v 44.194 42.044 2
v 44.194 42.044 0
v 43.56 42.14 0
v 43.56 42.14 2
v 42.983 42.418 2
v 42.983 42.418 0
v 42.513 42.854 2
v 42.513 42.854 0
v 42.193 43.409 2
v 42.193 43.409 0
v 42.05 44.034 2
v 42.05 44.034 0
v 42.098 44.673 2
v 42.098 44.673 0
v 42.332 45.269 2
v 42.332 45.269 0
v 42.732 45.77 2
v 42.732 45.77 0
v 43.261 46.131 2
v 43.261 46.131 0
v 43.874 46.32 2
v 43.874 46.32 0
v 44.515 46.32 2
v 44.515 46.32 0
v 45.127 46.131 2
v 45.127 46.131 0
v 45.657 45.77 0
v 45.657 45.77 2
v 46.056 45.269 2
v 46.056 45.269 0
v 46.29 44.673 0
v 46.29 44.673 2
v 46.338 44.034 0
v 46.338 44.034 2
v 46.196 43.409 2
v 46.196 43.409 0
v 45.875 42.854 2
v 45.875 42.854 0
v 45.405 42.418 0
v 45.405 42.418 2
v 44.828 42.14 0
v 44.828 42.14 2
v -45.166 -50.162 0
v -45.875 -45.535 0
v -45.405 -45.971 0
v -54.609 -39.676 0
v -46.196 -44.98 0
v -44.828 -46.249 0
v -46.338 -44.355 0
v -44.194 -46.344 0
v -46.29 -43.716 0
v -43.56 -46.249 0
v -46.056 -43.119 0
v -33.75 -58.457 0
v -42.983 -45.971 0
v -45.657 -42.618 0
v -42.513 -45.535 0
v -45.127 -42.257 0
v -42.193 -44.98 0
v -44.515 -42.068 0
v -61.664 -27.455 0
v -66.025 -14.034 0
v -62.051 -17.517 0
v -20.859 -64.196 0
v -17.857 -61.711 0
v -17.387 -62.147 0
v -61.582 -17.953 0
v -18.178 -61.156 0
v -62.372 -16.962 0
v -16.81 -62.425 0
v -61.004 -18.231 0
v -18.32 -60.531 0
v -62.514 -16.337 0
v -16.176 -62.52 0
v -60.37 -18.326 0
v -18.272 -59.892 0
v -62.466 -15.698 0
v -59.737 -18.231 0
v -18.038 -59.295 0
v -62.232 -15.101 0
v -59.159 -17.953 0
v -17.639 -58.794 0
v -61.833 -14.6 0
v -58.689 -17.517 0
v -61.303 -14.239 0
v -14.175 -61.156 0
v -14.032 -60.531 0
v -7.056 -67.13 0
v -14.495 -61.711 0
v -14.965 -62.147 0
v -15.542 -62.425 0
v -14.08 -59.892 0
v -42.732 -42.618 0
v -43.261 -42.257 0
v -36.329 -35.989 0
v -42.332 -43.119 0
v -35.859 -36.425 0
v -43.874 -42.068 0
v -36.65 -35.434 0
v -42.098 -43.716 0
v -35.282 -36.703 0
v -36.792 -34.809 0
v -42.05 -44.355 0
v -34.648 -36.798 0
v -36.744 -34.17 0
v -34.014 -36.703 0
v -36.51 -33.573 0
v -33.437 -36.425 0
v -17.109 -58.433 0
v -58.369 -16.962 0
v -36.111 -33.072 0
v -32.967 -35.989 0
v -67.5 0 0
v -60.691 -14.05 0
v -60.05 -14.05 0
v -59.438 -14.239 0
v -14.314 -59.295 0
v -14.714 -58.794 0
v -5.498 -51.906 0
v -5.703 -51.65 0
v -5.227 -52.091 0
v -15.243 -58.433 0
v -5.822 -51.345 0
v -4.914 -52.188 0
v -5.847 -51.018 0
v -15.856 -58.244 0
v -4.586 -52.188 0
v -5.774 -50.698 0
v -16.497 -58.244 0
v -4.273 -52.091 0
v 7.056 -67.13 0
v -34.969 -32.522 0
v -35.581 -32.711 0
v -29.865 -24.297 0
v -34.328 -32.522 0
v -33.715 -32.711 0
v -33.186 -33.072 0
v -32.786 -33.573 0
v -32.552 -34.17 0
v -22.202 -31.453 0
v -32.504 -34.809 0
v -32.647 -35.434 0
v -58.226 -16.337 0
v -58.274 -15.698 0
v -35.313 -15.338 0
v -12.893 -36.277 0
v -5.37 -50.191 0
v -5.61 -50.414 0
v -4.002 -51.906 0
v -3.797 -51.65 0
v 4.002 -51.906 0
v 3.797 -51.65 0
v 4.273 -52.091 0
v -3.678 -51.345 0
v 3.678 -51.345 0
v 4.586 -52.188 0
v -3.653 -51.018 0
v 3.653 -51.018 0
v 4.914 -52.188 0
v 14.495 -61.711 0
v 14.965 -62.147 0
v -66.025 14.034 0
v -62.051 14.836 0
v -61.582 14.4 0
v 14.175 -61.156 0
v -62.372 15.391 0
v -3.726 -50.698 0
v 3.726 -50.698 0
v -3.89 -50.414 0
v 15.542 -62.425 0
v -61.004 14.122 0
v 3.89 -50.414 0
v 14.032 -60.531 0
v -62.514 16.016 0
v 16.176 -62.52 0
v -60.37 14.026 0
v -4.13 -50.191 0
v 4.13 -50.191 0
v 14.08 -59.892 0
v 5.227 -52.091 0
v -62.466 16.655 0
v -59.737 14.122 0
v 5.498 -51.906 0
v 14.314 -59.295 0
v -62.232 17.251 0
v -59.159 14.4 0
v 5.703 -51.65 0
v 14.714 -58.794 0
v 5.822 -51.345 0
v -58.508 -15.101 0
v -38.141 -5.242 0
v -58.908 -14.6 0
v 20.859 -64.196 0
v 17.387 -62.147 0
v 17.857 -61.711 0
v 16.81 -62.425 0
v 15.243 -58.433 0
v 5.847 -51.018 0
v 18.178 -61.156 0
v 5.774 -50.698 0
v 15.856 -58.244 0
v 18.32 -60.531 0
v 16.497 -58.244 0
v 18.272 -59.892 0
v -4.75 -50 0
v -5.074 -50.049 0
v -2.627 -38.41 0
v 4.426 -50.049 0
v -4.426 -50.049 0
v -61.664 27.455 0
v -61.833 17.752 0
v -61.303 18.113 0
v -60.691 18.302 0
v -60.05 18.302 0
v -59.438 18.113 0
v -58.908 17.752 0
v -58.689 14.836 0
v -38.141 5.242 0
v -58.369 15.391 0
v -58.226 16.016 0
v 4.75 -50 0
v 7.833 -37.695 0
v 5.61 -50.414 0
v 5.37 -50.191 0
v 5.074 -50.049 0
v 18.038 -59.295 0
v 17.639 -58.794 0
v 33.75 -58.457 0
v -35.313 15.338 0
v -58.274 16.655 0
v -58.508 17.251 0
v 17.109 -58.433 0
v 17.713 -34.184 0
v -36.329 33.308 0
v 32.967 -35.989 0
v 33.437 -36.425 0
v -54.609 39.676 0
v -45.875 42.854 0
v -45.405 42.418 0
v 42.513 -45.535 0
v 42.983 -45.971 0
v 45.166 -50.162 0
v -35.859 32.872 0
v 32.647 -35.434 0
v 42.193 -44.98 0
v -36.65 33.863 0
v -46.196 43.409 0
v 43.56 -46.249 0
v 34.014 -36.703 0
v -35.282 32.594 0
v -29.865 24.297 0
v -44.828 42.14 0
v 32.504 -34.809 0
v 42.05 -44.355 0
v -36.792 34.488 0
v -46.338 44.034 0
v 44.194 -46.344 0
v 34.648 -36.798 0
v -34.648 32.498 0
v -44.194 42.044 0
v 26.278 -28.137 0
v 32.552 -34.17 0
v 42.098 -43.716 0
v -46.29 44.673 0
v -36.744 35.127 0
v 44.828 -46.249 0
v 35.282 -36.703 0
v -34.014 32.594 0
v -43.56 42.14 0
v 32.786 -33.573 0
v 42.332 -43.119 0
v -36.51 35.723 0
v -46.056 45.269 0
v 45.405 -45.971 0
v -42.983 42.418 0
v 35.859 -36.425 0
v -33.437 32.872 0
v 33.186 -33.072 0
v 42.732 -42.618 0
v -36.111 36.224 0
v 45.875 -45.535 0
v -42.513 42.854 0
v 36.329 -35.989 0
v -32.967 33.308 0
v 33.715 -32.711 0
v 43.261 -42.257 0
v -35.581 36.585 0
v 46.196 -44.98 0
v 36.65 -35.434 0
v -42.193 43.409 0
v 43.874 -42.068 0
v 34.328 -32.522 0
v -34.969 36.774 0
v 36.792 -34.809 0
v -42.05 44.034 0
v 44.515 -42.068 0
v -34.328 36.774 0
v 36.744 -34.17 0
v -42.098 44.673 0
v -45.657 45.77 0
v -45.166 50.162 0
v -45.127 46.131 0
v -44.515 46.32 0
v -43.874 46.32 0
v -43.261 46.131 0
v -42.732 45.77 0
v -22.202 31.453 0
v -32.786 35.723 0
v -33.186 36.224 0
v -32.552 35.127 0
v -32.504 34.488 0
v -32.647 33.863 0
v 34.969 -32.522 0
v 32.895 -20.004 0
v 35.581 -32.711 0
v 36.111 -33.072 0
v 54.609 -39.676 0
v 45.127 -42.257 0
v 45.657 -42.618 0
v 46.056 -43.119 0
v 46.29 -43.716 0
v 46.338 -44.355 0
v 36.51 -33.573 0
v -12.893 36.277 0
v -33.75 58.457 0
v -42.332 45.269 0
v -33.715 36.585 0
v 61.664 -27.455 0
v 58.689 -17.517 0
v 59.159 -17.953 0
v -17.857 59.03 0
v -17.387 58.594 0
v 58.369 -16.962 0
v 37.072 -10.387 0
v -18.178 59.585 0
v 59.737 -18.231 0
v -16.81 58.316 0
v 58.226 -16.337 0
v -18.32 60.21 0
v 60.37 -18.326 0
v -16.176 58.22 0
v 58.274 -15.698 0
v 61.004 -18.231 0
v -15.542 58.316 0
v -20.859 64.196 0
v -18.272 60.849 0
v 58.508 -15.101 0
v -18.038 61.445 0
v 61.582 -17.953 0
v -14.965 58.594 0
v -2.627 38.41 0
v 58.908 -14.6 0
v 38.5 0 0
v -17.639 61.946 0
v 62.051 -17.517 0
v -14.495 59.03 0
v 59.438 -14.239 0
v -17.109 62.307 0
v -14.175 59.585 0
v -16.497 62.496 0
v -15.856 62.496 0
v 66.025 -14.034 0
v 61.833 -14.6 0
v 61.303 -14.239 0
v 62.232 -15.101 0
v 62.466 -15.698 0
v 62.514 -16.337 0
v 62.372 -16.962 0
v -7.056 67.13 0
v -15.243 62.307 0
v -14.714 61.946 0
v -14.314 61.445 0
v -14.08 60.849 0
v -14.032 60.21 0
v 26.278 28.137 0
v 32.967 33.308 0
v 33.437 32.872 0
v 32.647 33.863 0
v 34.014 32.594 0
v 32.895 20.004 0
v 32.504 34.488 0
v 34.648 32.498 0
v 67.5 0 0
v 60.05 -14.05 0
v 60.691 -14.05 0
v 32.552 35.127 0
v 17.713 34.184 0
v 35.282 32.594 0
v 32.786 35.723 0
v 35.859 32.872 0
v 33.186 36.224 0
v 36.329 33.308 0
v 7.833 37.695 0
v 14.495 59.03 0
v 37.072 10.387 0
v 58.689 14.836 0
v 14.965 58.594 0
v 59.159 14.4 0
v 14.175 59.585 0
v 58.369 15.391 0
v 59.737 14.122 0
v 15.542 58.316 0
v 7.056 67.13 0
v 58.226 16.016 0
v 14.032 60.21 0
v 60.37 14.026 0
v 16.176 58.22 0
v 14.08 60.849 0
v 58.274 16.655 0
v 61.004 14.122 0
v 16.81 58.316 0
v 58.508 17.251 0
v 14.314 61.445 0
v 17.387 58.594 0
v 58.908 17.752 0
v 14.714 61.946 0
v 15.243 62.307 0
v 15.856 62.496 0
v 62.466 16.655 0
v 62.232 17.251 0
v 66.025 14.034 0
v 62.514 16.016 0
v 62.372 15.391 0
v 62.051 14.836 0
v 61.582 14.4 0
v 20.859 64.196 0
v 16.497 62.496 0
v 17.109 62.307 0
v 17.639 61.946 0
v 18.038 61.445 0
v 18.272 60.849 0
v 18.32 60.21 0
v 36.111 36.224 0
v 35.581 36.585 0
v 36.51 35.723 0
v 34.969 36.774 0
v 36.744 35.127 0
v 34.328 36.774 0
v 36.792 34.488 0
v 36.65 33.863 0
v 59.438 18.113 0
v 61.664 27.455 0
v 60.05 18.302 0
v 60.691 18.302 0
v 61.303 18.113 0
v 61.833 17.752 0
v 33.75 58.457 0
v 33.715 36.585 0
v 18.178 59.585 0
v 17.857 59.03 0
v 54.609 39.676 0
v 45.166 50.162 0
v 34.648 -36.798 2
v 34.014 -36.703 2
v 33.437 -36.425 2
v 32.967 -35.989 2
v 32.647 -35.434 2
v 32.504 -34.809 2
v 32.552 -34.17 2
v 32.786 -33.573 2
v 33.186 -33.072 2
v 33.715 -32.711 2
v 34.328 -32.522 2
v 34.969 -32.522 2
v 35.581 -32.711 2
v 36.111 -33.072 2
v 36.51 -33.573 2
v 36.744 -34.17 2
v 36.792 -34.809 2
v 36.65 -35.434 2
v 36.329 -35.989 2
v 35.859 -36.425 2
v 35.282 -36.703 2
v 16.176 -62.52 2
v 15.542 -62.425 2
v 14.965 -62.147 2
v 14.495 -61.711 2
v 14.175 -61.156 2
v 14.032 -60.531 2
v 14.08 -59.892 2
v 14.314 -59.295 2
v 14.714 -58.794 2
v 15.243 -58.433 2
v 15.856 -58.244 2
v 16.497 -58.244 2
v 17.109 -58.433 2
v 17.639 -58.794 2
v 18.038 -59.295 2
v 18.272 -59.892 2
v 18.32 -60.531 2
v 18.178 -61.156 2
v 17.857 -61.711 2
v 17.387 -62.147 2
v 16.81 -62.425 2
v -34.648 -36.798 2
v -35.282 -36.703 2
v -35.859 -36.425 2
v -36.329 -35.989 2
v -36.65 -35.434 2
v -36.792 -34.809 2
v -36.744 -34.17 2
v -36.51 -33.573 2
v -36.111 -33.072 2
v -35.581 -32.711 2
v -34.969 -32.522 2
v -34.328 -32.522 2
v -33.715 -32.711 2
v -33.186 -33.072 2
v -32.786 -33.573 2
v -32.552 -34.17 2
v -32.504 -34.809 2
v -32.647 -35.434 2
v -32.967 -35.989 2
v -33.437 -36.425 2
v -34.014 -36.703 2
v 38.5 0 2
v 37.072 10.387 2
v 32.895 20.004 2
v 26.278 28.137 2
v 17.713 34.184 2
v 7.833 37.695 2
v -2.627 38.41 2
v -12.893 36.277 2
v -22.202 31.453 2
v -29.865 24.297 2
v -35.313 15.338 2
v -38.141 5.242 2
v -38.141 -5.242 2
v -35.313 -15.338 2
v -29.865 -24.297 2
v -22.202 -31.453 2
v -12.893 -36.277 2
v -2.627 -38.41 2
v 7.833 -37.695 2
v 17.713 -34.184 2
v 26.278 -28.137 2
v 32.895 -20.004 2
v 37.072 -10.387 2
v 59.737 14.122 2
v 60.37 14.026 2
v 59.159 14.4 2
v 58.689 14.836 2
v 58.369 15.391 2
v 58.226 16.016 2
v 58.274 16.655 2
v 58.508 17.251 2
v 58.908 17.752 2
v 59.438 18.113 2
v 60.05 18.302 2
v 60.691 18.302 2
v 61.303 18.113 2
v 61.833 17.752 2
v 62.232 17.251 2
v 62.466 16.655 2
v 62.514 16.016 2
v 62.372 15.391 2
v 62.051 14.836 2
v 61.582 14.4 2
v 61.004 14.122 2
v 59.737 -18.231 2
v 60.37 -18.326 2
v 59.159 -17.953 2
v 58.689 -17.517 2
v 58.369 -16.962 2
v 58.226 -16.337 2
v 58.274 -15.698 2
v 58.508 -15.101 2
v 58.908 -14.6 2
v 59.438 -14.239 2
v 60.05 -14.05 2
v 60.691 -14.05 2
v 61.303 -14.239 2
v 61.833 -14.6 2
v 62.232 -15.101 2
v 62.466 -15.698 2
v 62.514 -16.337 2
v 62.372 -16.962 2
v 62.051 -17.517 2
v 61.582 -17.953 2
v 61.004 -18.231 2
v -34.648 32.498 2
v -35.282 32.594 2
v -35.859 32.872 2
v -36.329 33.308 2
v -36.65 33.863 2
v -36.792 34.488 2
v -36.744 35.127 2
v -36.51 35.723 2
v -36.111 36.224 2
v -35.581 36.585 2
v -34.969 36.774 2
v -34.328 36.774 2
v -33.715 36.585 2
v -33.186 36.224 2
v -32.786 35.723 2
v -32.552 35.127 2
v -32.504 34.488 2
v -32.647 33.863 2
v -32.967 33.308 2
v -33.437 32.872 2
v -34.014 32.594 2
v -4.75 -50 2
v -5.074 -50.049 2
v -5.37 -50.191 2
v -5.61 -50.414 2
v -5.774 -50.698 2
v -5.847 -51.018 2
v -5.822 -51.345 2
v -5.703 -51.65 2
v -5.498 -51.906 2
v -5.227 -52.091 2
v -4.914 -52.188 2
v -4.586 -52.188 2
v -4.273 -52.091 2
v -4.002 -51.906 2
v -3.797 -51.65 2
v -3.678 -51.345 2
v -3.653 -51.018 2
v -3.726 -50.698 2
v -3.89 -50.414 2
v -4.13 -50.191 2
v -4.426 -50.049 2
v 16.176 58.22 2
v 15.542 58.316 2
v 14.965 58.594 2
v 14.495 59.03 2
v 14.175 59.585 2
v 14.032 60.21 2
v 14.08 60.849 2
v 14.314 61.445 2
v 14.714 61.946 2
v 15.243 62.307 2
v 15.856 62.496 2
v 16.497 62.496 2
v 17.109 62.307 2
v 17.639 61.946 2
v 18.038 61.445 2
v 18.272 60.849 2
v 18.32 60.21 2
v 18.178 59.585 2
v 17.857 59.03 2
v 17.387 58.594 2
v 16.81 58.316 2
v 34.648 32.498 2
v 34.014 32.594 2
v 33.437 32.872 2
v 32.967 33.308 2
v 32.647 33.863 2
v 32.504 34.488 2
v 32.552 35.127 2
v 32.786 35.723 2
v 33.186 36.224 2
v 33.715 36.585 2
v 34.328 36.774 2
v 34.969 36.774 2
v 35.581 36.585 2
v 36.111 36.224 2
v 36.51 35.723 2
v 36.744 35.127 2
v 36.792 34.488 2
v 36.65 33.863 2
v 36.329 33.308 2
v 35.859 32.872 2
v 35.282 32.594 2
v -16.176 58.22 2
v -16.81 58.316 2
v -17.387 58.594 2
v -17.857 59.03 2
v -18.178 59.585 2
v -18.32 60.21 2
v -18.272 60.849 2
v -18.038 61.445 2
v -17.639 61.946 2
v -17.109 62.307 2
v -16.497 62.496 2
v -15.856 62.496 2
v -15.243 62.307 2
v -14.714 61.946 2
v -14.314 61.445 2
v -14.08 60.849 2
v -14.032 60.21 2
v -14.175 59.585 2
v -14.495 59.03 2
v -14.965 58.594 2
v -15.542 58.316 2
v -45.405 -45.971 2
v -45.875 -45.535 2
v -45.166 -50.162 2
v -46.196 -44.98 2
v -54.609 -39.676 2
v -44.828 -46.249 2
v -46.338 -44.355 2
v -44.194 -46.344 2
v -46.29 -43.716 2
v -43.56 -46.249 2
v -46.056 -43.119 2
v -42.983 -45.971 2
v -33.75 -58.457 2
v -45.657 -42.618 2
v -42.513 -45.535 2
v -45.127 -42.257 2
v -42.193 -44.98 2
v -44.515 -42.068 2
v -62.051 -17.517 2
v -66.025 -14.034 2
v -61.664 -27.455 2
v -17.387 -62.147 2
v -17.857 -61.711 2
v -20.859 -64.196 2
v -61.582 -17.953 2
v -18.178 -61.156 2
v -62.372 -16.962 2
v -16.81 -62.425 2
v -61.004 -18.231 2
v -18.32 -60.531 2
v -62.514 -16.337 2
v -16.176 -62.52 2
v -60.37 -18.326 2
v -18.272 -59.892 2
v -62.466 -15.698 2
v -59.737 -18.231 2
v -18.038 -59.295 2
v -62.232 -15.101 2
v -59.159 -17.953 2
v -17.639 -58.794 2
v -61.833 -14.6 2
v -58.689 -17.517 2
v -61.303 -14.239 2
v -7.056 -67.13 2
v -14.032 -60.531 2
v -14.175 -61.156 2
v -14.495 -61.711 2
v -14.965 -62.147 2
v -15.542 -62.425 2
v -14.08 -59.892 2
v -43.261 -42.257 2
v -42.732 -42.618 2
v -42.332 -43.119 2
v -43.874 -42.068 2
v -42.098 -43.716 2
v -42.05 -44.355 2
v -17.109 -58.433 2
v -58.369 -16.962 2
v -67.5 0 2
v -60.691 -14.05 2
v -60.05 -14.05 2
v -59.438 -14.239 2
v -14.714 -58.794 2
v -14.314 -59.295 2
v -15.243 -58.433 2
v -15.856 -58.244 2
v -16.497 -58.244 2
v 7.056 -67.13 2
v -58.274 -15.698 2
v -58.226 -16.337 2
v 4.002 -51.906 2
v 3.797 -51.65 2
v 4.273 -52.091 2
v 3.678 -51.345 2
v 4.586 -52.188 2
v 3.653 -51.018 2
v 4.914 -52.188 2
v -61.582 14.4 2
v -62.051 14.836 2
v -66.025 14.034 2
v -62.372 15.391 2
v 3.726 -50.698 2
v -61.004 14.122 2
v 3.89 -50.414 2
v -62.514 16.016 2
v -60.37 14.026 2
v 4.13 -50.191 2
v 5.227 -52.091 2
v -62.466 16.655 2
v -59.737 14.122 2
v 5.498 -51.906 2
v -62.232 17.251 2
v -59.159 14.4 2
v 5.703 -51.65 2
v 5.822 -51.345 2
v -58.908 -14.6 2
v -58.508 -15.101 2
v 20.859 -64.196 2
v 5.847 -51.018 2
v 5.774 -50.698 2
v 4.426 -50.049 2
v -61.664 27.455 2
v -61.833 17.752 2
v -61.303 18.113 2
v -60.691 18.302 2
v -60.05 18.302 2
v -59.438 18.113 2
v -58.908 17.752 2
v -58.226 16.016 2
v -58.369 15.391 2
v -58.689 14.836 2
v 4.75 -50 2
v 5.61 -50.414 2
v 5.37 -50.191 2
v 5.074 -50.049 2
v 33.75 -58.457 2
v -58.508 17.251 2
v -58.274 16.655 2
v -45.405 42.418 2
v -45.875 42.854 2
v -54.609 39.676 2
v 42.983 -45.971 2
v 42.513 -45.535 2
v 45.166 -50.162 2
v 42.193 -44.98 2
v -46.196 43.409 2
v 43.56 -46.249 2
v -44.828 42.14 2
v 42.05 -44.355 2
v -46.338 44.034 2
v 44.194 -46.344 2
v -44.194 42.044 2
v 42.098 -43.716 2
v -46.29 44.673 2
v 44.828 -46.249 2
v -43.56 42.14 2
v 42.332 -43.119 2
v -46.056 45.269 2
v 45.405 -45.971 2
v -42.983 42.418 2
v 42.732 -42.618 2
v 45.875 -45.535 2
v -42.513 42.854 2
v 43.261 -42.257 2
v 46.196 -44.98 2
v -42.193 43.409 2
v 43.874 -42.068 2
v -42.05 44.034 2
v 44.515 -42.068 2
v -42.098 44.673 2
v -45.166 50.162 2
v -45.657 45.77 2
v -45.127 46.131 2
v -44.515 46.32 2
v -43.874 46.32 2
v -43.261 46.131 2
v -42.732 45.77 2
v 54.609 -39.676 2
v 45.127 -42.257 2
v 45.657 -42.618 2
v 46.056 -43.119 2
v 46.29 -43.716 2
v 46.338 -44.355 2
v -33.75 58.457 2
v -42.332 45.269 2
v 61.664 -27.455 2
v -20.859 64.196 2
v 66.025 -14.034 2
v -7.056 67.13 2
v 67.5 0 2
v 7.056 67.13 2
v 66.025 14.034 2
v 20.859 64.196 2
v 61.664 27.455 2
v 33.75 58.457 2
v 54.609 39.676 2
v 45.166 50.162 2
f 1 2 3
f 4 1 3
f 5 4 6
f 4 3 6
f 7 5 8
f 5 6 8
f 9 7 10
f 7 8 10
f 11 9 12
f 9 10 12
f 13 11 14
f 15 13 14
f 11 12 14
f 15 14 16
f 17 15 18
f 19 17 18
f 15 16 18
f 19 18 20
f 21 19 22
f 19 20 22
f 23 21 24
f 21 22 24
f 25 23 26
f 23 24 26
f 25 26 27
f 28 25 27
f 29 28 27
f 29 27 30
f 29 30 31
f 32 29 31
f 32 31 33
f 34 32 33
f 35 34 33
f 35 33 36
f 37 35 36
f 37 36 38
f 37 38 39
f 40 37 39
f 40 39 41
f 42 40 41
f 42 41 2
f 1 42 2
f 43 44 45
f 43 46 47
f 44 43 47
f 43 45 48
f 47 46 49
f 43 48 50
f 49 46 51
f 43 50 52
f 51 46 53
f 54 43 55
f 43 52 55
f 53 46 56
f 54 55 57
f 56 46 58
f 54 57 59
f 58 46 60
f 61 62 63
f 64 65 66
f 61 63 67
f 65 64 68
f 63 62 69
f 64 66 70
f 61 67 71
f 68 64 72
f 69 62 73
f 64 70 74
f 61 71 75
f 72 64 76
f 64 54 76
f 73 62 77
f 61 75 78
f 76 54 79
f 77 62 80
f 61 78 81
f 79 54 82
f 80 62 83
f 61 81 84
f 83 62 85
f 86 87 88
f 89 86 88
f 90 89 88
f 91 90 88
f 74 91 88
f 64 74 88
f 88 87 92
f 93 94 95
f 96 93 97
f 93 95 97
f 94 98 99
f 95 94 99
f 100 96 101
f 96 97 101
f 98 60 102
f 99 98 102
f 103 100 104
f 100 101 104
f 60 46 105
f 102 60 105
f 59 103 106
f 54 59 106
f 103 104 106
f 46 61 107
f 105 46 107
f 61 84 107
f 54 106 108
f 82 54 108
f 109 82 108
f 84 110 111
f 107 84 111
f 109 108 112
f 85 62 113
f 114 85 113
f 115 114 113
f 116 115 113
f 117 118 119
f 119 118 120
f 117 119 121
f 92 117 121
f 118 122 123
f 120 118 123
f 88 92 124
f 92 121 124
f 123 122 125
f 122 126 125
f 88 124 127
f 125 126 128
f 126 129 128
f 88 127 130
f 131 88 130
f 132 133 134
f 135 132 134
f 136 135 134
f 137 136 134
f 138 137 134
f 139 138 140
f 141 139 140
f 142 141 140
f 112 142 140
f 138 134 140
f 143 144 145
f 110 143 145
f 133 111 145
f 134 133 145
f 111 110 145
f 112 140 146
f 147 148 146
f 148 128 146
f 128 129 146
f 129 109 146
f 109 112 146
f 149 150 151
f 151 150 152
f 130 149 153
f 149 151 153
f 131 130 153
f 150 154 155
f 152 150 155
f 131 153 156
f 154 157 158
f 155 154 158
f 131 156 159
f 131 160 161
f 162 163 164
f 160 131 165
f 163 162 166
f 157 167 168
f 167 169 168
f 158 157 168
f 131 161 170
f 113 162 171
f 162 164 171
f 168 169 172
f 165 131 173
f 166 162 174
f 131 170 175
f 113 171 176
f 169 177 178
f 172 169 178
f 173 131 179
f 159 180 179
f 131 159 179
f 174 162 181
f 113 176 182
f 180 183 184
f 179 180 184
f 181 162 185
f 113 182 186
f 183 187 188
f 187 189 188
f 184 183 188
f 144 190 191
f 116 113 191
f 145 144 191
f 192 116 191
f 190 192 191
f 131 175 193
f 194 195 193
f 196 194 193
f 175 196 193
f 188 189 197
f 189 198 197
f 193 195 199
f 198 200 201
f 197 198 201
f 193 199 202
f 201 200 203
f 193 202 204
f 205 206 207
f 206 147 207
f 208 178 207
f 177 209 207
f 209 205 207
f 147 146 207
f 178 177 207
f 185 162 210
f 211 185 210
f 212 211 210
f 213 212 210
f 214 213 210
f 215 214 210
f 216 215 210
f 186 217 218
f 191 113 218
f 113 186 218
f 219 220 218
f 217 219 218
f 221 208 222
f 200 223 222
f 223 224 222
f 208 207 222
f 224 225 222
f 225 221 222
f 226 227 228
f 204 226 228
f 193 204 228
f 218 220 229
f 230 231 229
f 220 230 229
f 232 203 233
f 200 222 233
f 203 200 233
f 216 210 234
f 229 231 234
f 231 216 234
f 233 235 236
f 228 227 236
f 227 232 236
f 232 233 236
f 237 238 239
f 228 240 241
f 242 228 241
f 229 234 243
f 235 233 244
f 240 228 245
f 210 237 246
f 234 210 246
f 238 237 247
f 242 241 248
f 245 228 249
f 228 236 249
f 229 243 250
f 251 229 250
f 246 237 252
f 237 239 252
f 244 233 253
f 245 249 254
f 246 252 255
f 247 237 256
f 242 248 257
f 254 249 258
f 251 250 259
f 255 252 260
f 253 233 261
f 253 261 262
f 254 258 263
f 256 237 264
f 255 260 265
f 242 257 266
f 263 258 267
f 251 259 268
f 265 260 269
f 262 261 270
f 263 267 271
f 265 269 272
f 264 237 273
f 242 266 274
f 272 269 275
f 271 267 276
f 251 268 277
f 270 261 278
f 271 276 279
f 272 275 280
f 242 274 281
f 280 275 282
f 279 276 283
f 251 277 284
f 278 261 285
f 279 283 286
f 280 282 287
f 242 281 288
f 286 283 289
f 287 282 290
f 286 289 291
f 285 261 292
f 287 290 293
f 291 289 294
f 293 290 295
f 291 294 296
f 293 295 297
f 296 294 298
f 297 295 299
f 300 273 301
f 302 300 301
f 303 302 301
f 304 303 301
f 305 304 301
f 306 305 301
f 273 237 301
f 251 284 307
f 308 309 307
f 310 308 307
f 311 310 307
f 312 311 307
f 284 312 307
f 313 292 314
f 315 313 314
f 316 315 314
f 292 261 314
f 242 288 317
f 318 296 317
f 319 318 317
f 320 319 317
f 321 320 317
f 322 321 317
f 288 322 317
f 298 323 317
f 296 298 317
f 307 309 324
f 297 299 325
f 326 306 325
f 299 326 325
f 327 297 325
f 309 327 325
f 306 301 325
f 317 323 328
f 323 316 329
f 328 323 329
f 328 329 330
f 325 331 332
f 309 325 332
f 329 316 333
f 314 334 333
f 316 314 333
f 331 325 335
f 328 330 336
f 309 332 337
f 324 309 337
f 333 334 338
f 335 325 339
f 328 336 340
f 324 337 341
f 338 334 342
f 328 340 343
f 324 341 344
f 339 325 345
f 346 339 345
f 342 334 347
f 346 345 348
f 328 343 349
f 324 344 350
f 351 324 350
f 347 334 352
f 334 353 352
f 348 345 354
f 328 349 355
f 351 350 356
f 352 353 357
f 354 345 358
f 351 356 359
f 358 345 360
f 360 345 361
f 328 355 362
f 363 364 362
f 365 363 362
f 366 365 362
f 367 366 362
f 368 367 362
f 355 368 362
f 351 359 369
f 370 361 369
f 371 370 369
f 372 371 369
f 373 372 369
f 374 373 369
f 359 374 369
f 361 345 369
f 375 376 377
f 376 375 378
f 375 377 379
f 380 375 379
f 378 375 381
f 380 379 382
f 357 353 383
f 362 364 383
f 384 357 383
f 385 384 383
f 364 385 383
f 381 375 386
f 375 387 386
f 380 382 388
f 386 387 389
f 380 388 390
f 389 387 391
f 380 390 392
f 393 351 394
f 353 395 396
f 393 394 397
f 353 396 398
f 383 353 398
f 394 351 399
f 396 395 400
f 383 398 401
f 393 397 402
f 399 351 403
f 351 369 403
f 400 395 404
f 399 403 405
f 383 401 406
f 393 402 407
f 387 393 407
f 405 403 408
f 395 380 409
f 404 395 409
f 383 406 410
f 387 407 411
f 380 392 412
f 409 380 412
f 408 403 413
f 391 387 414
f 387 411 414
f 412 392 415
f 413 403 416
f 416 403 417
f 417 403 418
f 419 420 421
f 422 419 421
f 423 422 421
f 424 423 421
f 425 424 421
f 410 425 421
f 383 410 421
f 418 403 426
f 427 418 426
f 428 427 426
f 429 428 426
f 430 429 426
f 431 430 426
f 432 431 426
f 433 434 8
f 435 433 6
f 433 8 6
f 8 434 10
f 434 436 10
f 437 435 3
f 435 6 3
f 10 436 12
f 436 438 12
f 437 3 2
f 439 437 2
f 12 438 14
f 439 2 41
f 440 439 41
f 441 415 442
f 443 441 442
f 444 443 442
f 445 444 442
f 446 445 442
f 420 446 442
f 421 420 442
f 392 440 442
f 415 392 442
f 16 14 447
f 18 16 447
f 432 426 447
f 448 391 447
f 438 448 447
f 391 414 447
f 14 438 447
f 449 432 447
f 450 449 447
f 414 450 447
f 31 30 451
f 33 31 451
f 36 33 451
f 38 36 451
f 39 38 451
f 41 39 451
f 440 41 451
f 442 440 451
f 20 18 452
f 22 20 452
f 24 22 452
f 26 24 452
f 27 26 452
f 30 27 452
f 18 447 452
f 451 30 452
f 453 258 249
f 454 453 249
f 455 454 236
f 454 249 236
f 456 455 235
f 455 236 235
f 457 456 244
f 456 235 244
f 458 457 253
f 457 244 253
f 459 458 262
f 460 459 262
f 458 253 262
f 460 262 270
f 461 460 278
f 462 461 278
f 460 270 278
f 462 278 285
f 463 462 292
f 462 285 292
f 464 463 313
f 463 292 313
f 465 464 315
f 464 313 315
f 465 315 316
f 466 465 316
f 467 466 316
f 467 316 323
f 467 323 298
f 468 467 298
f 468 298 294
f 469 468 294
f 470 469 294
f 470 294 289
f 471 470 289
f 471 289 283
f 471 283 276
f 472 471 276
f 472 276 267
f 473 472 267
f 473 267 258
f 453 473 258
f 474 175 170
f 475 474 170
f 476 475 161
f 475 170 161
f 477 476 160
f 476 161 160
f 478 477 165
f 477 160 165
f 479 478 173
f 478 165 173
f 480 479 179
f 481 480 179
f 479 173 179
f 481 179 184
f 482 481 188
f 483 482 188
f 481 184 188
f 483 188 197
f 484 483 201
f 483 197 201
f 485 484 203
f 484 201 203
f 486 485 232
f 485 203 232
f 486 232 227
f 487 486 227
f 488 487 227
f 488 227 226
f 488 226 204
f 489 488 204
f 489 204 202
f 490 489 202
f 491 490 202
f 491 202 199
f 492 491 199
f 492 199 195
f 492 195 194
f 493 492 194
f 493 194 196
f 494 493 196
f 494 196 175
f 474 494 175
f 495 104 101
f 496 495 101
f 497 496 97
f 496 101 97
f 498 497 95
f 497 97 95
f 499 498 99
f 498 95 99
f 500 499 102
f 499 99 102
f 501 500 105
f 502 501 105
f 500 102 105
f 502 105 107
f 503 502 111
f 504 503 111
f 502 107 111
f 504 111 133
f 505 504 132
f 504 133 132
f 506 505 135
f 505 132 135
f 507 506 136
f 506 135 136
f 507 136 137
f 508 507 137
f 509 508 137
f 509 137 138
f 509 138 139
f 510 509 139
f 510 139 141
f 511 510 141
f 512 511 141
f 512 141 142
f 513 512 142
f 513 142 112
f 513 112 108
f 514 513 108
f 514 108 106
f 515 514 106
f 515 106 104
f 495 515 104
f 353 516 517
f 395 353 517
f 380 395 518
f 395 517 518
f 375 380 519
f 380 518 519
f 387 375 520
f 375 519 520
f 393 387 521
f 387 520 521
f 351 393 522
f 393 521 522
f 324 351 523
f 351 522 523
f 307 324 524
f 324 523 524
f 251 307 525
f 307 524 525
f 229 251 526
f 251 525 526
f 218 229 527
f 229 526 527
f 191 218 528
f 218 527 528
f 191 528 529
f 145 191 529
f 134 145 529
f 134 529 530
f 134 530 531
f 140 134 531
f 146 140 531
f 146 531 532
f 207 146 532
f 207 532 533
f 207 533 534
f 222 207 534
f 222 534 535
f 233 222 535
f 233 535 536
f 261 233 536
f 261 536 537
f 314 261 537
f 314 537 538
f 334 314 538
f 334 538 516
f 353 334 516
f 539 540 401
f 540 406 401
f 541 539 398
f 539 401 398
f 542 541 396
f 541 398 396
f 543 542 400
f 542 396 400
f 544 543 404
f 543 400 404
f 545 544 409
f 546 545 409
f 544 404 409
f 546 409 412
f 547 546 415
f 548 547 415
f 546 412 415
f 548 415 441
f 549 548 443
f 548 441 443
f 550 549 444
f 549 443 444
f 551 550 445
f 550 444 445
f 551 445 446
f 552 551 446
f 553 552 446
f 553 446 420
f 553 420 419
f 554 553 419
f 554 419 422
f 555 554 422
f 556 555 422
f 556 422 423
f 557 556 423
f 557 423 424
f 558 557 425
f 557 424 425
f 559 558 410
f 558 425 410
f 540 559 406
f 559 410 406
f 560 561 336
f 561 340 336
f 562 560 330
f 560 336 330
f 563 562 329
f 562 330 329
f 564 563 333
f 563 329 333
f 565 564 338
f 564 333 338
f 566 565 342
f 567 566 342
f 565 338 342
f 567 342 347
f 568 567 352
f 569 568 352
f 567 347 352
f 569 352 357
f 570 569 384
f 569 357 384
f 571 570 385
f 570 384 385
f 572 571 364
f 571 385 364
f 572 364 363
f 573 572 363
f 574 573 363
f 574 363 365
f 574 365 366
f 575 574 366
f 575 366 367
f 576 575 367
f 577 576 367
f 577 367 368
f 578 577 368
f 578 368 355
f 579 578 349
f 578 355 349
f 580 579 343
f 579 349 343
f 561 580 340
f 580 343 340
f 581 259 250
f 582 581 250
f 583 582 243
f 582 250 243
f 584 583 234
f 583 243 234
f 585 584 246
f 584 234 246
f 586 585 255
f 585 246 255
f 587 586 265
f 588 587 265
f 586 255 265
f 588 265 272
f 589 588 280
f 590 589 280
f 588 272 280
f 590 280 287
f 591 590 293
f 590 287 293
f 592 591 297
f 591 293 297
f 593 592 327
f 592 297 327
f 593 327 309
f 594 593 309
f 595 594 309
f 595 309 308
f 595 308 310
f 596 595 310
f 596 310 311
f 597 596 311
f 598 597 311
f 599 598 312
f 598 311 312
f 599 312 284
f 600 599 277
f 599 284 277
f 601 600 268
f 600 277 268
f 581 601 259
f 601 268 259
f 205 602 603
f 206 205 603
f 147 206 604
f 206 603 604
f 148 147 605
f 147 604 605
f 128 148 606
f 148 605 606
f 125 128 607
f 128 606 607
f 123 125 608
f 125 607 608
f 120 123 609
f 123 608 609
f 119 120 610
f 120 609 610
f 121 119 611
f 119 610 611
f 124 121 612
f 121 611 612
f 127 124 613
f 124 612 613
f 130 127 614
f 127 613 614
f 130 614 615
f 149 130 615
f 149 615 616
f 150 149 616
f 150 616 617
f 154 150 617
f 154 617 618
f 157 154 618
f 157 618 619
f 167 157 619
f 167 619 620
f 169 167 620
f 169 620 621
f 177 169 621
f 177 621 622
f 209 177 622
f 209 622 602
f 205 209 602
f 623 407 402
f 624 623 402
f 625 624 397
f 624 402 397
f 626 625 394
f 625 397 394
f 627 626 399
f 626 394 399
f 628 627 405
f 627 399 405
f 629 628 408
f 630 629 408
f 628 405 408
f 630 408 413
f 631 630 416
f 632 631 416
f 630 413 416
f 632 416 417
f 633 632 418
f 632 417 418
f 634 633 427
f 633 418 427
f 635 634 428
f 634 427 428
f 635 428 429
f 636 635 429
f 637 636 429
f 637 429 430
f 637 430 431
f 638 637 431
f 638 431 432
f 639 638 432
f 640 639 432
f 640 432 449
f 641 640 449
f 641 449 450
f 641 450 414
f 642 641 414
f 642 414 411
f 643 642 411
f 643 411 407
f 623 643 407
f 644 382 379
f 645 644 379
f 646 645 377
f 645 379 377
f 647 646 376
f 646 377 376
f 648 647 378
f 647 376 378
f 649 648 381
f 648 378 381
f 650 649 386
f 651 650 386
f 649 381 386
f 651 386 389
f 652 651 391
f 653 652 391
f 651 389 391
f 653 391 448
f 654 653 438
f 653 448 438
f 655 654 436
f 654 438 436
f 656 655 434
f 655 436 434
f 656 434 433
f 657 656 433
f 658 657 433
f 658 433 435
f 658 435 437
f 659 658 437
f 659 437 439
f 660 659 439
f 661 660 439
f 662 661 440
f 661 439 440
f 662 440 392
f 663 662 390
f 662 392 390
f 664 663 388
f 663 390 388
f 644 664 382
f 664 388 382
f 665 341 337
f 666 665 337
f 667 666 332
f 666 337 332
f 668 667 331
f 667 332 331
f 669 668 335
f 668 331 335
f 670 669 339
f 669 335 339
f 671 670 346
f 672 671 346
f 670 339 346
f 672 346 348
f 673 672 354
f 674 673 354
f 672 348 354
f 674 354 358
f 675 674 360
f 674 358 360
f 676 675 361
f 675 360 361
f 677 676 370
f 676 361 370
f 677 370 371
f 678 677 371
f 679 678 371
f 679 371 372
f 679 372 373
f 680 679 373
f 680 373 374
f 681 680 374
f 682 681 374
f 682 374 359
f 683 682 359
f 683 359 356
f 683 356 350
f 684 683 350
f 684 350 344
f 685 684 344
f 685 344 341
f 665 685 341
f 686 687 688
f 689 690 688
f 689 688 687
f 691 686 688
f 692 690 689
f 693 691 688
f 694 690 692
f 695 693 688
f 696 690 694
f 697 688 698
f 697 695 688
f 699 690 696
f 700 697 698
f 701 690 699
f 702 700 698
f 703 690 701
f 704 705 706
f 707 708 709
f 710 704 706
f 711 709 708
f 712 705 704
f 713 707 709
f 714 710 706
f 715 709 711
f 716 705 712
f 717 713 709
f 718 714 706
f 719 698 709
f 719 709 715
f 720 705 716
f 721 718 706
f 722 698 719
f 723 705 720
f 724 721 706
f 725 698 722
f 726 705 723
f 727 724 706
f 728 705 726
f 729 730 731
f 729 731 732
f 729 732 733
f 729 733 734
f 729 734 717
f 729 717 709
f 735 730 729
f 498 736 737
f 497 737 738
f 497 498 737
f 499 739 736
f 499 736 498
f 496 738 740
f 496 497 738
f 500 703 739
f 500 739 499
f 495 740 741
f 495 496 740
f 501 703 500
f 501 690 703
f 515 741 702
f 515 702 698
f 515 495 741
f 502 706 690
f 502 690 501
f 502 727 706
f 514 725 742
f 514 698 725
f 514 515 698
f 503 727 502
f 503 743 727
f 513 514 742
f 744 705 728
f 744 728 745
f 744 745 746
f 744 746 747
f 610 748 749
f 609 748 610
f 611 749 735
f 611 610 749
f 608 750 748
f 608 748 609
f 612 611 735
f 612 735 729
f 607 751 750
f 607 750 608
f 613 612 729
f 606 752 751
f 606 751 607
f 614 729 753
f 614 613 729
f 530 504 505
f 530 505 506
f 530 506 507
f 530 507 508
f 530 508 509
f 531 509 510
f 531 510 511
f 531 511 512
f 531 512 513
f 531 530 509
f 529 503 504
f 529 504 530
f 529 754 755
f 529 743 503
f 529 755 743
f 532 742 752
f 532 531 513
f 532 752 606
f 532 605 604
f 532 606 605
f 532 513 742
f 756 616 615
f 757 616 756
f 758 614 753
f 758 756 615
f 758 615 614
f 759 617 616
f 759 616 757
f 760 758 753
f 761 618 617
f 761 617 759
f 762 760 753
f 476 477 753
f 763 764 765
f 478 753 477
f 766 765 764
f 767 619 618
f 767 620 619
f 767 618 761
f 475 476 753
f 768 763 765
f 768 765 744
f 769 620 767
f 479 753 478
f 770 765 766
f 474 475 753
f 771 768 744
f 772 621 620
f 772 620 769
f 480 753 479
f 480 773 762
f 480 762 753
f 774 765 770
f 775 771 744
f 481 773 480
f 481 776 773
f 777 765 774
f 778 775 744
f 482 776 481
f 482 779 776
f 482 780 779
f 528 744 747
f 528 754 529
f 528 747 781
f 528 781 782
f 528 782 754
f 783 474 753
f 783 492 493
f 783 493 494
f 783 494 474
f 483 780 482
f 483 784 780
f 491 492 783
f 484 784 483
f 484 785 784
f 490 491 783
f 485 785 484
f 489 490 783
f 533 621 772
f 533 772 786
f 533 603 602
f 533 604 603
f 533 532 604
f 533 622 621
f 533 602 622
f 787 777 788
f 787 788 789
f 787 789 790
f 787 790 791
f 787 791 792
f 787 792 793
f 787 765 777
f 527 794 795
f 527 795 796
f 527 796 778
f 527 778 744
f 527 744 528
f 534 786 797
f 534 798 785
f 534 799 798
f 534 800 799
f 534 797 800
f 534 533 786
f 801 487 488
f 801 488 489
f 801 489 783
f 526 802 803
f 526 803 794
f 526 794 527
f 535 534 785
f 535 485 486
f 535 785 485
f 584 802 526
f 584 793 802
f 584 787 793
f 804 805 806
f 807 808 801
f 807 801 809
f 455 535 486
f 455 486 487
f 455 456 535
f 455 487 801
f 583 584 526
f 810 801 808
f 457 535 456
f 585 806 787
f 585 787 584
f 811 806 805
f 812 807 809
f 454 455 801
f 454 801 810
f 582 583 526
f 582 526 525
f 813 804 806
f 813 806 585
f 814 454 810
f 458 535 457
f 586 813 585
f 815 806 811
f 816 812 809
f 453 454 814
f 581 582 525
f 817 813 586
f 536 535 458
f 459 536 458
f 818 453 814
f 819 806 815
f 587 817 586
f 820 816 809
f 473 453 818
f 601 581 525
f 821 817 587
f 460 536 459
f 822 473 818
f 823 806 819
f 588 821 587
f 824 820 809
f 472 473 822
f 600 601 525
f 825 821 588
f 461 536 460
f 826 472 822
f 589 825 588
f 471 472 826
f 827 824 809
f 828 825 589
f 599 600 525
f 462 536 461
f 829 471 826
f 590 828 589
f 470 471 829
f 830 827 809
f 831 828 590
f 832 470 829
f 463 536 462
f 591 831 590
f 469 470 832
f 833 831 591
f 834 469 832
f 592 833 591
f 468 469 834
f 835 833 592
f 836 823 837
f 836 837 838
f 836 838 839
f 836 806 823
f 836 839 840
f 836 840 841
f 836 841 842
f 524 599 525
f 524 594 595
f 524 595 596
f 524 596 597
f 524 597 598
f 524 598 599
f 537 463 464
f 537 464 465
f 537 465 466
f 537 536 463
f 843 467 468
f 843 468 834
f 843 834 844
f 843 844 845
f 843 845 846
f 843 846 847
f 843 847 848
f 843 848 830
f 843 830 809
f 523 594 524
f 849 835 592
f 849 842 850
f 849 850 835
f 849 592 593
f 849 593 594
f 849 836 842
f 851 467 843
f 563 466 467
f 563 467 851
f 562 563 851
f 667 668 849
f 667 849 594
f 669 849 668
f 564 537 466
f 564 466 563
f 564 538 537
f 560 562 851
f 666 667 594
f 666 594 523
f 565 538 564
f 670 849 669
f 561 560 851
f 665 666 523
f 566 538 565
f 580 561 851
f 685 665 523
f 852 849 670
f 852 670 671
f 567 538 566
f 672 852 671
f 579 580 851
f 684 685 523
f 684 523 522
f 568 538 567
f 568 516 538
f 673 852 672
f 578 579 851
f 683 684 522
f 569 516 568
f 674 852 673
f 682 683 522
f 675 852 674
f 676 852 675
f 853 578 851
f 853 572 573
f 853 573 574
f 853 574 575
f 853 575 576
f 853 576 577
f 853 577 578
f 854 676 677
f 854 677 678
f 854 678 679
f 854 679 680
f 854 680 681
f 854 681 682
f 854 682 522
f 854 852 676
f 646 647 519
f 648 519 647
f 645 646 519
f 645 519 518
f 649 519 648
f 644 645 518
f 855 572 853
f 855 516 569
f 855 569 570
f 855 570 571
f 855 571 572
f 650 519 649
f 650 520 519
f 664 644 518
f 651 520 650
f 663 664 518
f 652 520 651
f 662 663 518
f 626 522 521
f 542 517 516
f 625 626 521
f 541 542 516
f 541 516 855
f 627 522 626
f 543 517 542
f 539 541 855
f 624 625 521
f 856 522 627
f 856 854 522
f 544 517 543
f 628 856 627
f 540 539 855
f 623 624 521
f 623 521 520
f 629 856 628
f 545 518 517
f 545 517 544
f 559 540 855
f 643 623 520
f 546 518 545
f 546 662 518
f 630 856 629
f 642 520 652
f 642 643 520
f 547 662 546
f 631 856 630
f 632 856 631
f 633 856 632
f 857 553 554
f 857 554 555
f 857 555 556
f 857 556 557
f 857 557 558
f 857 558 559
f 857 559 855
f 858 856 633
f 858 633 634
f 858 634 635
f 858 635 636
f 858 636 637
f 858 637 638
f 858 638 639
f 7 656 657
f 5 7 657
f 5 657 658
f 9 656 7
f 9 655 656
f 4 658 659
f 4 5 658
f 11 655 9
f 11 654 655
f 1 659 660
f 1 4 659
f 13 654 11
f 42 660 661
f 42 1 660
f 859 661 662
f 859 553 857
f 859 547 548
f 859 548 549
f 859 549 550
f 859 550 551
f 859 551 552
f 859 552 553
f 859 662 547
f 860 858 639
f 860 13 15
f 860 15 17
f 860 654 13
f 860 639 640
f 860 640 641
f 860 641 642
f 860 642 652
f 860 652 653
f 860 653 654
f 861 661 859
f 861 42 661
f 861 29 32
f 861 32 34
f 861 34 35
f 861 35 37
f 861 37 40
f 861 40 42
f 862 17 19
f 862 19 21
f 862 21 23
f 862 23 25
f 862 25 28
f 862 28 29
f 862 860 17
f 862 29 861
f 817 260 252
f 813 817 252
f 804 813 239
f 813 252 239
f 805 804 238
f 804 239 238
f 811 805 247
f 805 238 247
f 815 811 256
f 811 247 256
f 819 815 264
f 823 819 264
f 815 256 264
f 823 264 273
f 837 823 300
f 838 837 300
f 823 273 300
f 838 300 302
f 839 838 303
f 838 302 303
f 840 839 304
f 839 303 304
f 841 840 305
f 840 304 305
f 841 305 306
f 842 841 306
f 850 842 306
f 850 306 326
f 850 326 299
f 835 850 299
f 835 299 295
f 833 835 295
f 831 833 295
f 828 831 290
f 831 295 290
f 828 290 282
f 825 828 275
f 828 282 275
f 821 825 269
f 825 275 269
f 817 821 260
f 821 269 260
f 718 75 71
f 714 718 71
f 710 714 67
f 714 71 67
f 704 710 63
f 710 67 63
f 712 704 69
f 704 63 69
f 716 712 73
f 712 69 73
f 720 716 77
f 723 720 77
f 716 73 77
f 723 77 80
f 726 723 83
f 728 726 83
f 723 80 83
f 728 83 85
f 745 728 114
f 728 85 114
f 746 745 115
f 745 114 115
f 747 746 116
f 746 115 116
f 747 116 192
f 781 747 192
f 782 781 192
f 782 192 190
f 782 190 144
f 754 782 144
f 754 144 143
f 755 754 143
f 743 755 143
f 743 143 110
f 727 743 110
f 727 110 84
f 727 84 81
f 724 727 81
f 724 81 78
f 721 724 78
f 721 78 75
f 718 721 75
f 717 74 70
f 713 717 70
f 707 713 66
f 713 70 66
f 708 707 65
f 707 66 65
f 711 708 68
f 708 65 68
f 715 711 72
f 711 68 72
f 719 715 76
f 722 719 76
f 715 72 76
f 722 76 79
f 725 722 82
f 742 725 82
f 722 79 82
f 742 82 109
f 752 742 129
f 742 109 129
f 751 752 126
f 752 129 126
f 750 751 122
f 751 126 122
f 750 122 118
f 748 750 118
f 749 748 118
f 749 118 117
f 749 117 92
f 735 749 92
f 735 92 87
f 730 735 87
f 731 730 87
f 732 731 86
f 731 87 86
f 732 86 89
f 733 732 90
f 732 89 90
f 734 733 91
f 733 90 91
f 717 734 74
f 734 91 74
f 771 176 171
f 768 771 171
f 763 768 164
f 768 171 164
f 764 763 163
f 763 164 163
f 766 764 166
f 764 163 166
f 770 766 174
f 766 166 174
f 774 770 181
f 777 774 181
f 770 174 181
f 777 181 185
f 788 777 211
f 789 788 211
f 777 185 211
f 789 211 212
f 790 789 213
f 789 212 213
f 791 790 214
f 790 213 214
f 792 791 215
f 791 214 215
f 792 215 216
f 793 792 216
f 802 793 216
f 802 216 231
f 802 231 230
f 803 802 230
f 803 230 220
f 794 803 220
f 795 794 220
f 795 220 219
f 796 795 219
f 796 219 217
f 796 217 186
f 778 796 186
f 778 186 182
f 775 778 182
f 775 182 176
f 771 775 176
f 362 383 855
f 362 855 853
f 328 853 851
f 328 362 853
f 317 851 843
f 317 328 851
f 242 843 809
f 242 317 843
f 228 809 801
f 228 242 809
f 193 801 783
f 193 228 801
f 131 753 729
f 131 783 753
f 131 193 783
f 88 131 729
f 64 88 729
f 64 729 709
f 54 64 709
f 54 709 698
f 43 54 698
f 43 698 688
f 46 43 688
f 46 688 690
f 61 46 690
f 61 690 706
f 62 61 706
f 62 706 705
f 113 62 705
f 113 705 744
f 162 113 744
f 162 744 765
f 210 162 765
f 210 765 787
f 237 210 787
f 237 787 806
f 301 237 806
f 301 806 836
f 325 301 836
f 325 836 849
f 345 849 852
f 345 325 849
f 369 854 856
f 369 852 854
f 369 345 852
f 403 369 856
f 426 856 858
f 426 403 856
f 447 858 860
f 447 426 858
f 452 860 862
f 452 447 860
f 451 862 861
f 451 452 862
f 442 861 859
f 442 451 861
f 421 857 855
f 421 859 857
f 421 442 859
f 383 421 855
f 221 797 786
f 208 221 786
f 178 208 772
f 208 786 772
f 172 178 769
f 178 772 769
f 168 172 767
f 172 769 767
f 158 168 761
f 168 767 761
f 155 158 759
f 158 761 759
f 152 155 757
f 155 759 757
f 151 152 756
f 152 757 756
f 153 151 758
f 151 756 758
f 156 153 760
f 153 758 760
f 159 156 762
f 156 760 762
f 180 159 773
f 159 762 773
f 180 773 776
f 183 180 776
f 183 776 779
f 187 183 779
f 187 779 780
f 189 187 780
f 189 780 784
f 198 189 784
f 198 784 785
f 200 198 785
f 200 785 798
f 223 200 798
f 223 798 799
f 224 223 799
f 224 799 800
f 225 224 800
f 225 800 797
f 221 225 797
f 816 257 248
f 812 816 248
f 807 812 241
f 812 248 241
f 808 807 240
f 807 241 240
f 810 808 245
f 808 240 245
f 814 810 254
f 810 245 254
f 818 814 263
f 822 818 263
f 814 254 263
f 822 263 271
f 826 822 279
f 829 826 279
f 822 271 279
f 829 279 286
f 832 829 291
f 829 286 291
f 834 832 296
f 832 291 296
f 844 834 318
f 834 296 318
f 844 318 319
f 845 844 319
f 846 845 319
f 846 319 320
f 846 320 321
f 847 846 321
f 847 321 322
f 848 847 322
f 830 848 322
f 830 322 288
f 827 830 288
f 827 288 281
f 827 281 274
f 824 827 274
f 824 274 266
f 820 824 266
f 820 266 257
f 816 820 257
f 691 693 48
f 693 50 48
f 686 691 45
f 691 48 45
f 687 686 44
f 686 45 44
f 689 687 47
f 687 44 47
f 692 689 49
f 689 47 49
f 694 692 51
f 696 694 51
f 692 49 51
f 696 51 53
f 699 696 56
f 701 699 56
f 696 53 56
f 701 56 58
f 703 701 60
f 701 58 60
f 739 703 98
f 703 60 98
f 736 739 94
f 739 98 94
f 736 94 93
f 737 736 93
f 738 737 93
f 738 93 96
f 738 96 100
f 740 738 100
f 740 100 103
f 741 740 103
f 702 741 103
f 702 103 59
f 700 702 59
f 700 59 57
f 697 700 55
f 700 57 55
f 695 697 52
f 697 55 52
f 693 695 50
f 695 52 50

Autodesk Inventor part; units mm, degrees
ref_plane "YZ Plane" through (0, 0, 0) normal (1, 0, 0) x (0, 1, 0)
ref_plane "XZ Plane" through (0, 0, 0) normal (0, 1, 0) x (-1, 0, 0)
ref_plane "XY Plane" through (0, 0, 0) normal (0, 0, 1) x (1, 0, 0)
sketch "スケッチ1" plane through (0, 0, 0) normal (0, 0, 1) x (1, 0, 0)
  circle A0 centre (0, 0) radius 67.5
  dimension "d0" = 135
extrude "プレート1" add sketch "スケッチ1" along normal blind 2
sketch "スケッチ2" plane through (0, 0, 2) normal (0, 0, 1) x (1, 0, 0)
  circle A0 centre (0, 0) radius 38.5
  dimension "d2" = 77
extrude "押し出し1" cut sketch "スケッチ2" against normal through all
sketch "スケッチ3" plane through (0, 0, 2) normal (0, 0, 1) x (1, 0, 0)
  circle A0 centre (0, 0) radius 62.5
  point P0 (16.1762, 60.3704)
  point P1 (-16.1762, 60.3704)
  point P2 (-44.1942, 44.1942)
  point P3 (-60.3704, 16.1762)
  point P4 (-60.3704, -16.1762)
  point P5 (-44.1942, -44.1942)
  point P6 (-16.1762, -60.3704)
  point P7 (16.1762, -60.3704)
  point P8 (44.1942, -44.1942)
  point P9 (60.3704, -16.1762)
  point P10 (60.3704, 16.1762)
  point P11 (44.1942, 44.1942)
  dimension "d5" = 125
  dimension "d8" = 360
  dimension "d36" = 0
hole "穴1" at (16.1762, 60.3704, 2) at (-16.1762, 60.3704, 2) at (-44.1942, 44.1942, 2) at (-60.3704, 16.1762, 2) at (-60.3704, -16.1762, 2) at (-44.1942, -44.1942, 2) at (-16.1762, -60.3704, 2) at (16.1762, -60.3704, 2) at (44.1942, -44.1942, 2) at (60.3704, -16.1762, 2) at (60.3704, 16.1762, 2) at (44.1942, 44.1942, 2) direction (0, 0, -1) diameter 4.3 end through all clearance for "Flat Head Machine Screw" size "M4" standard "Ansi Metric M Profile"
sketch "スケッチ4" plane through (0, 0, 2) normal (0, 0, 1) x (1, 0, 0)
  circle A0 centre (0, 0) radius 49
  point P0 (-34.6482, 34.6482)
  point P1 (-34.6482, -34.6482)
  point P2 (34.6482, -34.6482)
  point P3 (34.6482, 34.6482)
  dimension "d17" = 98
  dimension "d20" = 360
  dimension "d29" = 0
hole "穴2" at (-34.6482, 34.6482, 2) at (-34.6482, -34.6482, 2) at (34.6482, -34.6482, 2) at (34.6482, 34.6482, 2) direction (0, 0, -1) diameter 4.3 end through all clearance for "Flat Head Machine Screw" size "M4" standard "Ansi Metric M Profile"
sketch "スケッチ6" plane through (0, 0, 0) normal (0, 0, -1) x (-1, 0, 0)
  circle A0 centre (0, 0) radius 37.5
  line L0 (-4.75, -42.3) -> (4.75, -42.3)
  line L1 (-4.75, -37.5) -> (4.75, -37.5)
  circle A1 centre (0, -37.5) radius 4.8
  point P0 (-4.75, -51.1)
  point P1 (4.75, -51.1)
  dimension "d37" = 75
  dimension "d38" = 9.5
  dimension "d39" = 8.8
  dimension "d40" = 13.6
  dimension "d41" = 4.75
hole "穴3" at (4.75, -51.1, 0) at (-4.75, -51.1, 0) direction (0, 0, 1) diameter 2.2 end through all clearance for "Socket Head Cap Screw" size "M2" standard "Ansi Metric M Profile"
equation "\"d15\" = Thickness"
equation "\"d27\" = Thickness"
equation "\"d47\" = Thickness"
equation "\"d1\" = Thickness"
equation "\"BendRadius\" = Thickness"
equation "\"BendReliefWidth\" = Thickness"
equation "\"BendReliefDepth\" = 0.5 * Thickness"
equation "\"CornerReliefSize\" = 4 * Thickness"
equation "\"MinimumRemnant\" = 2 * Thickness"
equation "\"TransitionRadius\" = BendRadius"
equation "\"JacobiRadiusSize\" = BendRadius"
equation "\"GapSize\" = Thickness"
equation "\"Thickness\" = 2"
properties part number "unit-j2-plate1" material "CFRP"
